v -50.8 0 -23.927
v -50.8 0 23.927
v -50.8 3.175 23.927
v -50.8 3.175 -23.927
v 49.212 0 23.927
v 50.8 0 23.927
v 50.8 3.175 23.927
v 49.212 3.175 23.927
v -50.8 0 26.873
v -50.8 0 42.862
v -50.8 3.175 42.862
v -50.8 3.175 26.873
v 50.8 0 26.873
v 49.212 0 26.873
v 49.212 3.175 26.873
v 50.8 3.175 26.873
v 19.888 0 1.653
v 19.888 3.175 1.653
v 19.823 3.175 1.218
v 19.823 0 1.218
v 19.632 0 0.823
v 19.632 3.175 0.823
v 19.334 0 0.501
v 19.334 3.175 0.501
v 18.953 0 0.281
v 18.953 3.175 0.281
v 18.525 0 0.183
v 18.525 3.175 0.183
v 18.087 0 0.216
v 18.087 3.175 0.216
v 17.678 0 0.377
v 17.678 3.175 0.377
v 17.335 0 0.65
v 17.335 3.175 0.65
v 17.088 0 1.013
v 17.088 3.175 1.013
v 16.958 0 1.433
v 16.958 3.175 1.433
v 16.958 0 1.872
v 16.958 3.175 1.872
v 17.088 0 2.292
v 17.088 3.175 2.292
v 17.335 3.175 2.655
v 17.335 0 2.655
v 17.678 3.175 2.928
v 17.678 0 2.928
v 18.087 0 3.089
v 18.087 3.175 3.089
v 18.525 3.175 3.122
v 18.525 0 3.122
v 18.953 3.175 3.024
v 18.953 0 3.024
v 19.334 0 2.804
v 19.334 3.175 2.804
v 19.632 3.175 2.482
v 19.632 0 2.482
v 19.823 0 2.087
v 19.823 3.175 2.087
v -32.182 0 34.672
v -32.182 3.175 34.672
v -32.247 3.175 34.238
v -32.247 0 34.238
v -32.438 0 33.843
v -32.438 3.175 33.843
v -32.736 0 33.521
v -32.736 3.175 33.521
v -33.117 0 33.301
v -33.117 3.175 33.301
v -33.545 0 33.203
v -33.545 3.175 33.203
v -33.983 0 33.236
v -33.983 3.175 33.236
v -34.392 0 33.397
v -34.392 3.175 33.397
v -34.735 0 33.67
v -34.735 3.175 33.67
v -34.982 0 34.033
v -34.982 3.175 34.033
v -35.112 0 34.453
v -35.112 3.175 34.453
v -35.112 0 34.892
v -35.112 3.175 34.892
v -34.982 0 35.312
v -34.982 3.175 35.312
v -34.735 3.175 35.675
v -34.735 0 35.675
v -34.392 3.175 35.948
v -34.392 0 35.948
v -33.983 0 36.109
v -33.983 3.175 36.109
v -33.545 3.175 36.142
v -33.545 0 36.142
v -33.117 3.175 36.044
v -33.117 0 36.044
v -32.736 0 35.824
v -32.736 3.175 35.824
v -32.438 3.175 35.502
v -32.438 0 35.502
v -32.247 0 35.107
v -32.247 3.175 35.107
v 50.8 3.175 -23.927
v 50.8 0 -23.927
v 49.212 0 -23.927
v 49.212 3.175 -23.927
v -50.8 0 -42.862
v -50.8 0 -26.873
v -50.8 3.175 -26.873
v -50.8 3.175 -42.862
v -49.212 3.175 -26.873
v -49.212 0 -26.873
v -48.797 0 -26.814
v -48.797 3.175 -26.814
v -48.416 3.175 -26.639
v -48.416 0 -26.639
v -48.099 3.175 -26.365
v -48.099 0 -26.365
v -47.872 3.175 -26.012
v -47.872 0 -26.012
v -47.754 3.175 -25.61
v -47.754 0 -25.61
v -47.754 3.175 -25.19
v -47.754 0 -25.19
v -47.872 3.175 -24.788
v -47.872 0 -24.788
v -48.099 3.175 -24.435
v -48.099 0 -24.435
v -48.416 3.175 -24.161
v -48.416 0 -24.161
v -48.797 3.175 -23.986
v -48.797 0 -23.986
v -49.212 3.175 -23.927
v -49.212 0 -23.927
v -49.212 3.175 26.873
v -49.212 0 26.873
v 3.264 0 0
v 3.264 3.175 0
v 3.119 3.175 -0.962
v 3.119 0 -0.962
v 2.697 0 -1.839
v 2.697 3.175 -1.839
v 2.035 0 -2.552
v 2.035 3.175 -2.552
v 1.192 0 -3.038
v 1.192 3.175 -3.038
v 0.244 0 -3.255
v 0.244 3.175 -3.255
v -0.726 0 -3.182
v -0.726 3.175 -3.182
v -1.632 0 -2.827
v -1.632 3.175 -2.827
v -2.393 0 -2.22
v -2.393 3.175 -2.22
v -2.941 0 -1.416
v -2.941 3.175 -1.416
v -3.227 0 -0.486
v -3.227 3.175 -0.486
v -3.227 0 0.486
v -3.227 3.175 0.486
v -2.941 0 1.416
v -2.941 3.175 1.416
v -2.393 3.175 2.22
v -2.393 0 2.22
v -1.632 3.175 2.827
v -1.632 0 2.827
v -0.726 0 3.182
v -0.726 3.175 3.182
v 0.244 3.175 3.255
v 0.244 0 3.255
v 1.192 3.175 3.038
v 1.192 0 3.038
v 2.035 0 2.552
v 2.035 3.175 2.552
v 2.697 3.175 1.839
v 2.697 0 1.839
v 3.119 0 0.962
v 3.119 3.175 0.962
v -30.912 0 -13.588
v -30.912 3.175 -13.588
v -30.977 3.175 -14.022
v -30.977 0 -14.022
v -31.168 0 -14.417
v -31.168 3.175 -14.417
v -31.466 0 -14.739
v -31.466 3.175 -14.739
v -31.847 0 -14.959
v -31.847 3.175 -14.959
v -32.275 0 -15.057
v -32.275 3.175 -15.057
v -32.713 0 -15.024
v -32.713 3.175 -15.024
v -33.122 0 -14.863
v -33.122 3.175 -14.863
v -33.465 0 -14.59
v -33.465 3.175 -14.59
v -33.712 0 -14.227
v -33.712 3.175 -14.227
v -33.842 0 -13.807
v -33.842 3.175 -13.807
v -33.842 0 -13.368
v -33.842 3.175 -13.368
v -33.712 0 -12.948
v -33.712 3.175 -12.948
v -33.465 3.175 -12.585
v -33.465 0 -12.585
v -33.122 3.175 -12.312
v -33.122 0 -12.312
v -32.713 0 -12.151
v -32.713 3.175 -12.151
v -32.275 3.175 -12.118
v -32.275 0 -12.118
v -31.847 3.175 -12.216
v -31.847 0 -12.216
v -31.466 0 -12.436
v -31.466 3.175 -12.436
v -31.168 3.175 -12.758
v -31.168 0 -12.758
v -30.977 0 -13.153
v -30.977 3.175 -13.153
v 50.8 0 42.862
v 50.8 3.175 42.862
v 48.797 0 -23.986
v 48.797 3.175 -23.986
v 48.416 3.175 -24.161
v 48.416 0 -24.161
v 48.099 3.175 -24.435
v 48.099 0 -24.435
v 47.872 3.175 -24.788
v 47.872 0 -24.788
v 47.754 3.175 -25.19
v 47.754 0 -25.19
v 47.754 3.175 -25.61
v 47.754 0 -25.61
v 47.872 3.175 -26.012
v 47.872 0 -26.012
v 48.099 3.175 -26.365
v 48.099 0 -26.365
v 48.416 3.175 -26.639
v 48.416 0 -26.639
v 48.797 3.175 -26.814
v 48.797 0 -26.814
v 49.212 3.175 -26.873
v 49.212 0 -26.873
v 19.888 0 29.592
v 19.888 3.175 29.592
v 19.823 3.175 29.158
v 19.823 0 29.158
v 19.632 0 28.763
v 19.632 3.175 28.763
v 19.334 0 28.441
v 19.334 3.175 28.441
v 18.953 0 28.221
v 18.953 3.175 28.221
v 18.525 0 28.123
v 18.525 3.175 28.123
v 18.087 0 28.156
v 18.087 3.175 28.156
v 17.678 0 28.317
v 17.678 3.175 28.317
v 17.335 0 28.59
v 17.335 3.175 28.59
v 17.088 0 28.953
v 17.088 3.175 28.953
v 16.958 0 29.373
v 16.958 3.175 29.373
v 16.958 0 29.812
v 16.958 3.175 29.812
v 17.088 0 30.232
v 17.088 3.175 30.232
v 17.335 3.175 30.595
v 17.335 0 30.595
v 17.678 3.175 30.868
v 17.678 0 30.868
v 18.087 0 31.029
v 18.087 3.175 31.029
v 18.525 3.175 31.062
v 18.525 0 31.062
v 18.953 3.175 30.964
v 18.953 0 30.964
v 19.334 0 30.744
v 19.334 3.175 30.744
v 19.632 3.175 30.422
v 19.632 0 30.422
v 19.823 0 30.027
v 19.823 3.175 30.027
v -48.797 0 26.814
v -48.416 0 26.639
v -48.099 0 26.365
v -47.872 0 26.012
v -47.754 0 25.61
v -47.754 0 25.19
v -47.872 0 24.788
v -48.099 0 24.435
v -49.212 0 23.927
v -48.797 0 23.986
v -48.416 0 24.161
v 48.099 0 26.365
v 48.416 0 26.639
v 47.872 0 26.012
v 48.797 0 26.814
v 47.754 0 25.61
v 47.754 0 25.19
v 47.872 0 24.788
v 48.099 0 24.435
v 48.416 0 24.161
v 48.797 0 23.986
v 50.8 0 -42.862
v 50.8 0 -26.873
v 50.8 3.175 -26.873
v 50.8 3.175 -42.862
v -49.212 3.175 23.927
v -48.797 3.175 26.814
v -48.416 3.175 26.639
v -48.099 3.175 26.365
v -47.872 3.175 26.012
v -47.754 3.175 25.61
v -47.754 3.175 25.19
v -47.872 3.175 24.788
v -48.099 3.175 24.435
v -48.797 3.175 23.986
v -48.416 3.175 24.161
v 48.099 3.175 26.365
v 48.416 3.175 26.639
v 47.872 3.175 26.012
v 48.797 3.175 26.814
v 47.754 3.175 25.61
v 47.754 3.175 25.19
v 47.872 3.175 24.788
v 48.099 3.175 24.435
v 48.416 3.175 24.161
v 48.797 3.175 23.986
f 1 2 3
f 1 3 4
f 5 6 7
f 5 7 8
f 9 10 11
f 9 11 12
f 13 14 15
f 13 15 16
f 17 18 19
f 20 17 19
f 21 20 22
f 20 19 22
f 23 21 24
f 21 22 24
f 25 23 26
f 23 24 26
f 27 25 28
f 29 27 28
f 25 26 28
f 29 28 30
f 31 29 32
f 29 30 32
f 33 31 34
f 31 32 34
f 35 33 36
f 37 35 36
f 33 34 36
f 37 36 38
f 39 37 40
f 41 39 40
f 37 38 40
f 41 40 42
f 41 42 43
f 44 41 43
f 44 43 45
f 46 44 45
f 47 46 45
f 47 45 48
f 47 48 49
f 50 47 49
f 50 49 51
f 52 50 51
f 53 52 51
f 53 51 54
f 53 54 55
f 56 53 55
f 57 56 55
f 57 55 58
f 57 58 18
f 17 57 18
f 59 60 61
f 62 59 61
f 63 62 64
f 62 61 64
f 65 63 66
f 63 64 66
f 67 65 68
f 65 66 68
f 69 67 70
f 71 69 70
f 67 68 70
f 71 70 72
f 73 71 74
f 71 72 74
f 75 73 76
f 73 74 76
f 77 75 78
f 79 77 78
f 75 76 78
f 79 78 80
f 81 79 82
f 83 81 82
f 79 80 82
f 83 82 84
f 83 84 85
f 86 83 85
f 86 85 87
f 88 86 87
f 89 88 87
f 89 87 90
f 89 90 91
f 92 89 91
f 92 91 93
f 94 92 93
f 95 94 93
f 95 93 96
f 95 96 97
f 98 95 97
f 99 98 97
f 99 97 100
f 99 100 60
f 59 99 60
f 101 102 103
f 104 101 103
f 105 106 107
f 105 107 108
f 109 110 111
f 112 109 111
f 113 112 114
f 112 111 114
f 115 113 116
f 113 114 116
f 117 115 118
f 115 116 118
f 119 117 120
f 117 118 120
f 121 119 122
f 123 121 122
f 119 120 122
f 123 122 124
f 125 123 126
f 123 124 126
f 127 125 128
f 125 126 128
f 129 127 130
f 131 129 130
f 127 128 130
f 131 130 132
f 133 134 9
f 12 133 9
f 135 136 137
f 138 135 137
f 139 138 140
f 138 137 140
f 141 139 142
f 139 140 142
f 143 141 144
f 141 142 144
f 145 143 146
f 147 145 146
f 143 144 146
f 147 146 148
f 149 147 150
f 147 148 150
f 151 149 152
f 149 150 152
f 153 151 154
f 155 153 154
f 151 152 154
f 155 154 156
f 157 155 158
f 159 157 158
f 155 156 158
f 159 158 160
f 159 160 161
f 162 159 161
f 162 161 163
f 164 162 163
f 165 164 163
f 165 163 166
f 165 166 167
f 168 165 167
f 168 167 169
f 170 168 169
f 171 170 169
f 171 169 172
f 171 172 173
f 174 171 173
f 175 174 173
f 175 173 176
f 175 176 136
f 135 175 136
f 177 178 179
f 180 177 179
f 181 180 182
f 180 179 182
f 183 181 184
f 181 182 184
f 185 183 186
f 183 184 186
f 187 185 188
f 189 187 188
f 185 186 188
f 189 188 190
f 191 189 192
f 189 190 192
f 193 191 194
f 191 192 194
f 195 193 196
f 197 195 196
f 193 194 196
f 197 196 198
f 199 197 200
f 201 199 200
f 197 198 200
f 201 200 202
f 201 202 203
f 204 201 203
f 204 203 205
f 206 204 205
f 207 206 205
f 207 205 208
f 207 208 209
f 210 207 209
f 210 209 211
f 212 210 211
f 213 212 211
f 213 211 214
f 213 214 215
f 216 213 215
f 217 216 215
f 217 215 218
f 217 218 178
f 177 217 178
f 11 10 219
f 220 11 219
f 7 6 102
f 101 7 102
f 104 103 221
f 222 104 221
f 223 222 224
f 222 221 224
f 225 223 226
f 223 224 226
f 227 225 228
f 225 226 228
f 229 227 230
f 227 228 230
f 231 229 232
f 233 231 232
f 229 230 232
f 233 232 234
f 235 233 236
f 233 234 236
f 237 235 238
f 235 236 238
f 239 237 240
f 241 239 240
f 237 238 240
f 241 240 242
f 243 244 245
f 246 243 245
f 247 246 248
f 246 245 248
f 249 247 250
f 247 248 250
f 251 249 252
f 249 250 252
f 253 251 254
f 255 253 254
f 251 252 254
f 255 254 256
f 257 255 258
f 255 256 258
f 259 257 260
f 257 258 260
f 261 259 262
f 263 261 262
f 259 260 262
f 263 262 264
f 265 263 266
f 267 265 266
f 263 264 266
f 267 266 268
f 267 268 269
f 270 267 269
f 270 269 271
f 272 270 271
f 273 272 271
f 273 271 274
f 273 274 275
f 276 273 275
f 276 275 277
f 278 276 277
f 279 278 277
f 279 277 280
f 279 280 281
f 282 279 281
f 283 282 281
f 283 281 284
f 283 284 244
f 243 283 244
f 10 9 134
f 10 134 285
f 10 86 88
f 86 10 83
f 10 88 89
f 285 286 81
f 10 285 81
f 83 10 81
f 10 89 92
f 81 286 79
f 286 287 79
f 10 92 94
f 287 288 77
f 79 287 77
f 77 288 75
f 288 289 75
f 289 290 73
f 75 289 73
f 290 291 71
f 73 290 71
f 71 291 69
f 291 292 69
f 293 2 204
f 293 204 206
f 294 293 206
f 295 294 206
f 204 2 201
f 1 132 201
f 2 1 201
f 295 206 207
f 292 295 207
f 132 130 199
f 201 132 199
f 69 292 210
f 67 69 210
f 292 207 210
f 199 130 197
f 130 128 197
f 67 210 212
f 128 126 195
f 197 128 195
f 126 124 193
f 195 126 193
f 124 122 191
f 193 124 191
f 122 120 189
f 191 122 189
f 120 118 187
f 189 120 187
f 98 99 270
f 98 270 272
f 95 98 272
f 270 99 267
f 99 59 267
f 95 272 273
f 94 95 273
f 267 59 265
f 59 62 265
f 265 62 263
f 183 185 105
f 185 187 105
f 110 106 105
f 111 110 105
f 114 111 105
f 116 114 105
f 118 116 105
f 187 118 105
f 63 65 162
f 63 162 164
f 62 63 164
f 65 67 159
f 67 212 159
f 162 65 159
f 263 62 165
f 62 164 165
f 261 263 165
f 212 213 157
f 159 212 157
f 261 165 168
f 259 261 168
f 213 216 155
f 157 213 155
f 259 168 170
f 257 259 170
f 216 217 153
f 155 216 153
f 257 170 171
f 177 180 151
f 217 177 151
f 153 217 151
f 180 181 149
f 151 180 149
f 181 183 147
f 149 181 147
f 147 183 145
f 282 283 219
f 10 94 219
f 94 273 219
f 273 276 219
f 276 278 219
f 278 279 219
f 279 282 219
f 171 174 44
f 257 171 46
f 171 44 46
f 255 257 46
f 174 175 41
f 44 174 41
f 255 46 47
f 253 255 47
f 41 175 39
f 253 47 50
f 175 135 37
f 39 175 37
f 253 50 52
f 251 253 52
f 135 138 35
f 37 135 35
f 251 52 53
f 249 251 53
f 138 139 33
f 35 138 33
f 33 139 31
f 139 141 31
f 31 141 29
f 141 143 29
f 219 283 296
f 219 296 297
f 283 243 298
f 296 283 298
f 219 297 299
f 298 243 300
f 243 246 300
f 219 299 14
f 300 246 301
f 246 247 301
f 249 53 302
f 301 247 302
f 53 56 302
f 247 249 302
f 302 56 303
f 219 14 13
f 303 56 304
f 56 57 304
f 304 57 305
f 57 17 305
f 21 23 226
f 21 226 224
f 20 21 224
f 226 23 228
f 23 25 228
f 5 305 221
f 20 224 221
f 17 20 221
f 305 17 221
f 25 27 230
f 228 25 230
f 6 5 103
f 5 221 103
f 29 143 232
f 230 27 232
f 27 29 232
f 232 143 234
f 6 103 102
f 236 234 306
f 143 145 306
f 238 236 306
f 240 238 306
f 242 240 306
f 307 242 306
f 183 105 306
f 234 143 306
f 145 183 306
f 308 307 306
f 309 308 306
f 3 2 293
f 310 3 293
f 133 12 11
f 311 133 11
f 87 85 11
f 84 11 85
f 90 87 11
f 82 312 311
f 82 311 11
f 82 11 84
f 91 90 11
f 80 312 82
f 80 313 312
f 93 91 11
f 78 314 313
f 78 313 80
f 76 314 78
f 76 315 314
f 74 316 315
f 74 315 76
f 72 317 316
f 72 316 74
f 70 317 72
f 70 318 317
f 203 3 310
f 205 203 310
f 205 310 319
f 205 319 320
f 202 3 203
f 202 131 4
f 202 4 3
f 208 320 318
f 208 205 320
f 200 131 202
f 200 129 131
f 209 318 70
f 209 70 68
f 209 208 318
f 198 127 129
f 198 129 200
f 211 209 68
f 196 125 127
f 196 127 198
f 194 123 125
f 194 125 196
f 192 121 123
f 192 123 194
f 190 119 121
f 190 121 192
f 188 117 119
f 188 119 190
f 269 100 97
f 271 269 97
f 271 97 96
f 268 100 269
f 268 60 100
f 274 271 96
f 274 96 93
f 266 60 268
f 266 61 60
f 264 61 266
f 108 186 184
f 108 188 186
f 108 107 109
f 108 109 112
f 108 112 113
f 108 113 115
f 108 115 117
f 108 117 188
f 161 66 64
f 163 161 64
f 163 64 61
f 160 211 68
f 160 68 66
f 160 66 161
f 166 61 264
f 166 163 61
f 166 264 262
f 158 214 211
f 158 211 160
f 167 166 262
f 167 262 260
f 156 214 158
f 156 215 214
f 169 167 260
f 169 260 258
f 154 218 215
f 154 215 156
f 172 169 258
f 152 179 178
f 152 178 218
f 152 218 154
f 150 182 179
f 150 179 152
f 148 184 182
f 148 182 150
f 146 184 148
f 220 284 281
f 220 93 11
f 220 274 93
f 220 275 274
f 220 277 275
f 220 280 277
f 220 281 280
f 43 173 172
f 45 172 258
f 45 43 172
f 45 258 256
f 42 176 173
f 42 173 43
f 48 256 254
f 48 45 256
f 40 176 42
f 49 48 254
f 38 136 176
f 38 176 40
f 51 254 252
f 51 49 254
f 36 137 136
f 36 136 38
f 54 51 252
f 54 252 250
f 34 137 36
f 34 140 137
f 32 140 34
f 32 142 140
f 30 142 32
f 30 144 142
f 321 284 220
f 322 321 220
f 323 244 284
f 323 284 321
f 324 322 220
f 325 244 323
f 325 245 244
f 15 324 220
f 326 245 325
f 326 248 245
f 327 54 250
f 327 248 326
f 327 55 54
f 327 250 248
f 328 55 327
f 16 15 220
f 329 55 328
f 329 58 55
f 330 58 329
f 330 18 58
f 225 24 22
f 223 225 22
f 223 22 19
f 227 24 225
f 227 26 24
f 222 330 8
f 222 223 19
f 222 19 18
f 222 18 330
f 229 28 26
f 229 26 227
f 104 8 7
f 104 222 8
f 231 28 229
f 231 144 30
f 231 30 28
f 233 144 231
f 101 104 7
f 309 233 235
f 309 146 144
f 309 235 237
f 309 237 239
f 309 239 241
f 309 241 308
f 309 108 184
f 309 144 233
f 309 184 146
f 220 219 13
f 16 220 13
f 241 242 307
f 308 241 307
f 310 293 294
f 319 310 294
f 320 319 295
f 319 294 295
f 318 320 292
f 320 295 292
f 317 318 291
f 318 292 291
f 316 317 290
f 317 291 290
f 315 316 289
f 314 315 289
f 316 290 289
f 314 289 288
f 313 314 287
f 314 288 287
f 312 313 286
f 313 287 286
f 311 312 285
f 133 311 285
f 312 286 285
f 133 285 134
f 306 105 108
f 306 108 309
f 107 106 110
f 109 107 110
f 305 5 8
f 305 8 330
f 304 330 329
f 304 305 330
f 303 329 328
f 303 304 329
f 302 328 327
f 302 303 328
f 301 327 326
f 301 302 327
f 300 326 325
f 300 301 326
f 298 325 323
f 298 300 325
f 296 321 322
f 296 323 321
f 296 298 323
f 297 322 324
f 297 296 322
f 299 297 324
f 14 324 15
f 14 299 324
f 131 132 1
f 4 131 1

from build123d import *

# Parameters (mm, degrees)
SKETCH1_W               = 101.6
SKETCH1_H               = 85.725
BOSS_EXTRUDE1_DEPTH     = 3.175
F_4_CLEARANCE_HOLE1_D   = 2.9464
CUT_EXTRUDE1_DEPTH      = 67.542576831
F_1_4_CLEARANCE_HOLE1_D = 6.5278


with BuildPart() as part:
    # Sketch1 → Boss-Extrude1 (new body)
    with BuildSketch(Plane(origin=(0, 0, 0), x_dir=(1, 0, 0), z_dir=(0, 1, 0))):
        Rectangle(SKETCH1_W, SKETCH1_H)
    extrude(amount=BOSS_EXTRUDE1_DEPTH)

    # #4 Clearance Hole1 (through all)
    with Locations(Plane(origin=(0, 0, 0), x_dir=(-1, 0, 0), z_dir=(0, -1, 0))):
        with Locations((-18.415, -1.6525), (-18.415, -29.5925), (33.655, -34.6725), (32.385, 13.5875)):
            Hole(F_4_CLEARANCE_HOLE1_D / 2)

    # Sketch4 → Cut-Extrude1 (cut, through all)
    with BuildSketch(Plane.XZ):
        with BuildLine():
            Line((49.2125, -26.8732), (50.8, -26.8732))
            Line((50.8, -26.8732), (50.8, -23.9268))
            Line((50.8, -23.9268), (49.2125, -23.9268))
            ThreePointArc((49.2125, -23.9268), (47.7393, -25.4), (49.2125, -26.8732))
        make_face()
        with BuildLine():
            Line((49.2125, 26.8732), (50.8, 26.8732))
            Line((50.8, 26.8732), (50.8, 23.9268))
            Line((50.8, 23.9268), (49.2125, 23.9268))
            ThreePointArc((49.2125, 23.9268), (47.7393, 25.4), (49.2125, 26.8732))
        make_face()
        with BuildLine():
            Line((-49.2125, 26.8732), (-50.8, 26.8732))
            Line((-50.8, 26.8732), (-50.8, 23.9268))
            Line((-50.8, 23.9268), (-49.2125, 23.9268))
            ThreePointArc((-49.2125, 23.9268), (-47.7393, 25.4), (-49.2125, 26.8732))
        make_face()
        with BuildLine():
            Line((-49.2125, -23.9268), (-50.8, -23.9268))
            Line((-50.8, -23.9268), (-50.8, -26.8732))
            Line((-50.8, -26.8732), (-49.2125, -26.8732))
            ThreePointArc((-49.2125, -26.8732), (-47.7393, -25.4), (-49.2125, -23.9268))
        make_face()
    extrude(amount=-CUT_EXTRUDE1_DEPTH, mode=Mode.SUBTRACT)

    # 1/4 Clearance Hole1 (through all)
    with Locations(Plane(origin=(0, 0, 0), x_dir=(-1, 0, 0), z_dir=(0, -1, 0))):
        with Locations((0, 0)):
            Hole(F_1_4_CLEARANCE_HOLE1_D / 2)


solid = part.part
